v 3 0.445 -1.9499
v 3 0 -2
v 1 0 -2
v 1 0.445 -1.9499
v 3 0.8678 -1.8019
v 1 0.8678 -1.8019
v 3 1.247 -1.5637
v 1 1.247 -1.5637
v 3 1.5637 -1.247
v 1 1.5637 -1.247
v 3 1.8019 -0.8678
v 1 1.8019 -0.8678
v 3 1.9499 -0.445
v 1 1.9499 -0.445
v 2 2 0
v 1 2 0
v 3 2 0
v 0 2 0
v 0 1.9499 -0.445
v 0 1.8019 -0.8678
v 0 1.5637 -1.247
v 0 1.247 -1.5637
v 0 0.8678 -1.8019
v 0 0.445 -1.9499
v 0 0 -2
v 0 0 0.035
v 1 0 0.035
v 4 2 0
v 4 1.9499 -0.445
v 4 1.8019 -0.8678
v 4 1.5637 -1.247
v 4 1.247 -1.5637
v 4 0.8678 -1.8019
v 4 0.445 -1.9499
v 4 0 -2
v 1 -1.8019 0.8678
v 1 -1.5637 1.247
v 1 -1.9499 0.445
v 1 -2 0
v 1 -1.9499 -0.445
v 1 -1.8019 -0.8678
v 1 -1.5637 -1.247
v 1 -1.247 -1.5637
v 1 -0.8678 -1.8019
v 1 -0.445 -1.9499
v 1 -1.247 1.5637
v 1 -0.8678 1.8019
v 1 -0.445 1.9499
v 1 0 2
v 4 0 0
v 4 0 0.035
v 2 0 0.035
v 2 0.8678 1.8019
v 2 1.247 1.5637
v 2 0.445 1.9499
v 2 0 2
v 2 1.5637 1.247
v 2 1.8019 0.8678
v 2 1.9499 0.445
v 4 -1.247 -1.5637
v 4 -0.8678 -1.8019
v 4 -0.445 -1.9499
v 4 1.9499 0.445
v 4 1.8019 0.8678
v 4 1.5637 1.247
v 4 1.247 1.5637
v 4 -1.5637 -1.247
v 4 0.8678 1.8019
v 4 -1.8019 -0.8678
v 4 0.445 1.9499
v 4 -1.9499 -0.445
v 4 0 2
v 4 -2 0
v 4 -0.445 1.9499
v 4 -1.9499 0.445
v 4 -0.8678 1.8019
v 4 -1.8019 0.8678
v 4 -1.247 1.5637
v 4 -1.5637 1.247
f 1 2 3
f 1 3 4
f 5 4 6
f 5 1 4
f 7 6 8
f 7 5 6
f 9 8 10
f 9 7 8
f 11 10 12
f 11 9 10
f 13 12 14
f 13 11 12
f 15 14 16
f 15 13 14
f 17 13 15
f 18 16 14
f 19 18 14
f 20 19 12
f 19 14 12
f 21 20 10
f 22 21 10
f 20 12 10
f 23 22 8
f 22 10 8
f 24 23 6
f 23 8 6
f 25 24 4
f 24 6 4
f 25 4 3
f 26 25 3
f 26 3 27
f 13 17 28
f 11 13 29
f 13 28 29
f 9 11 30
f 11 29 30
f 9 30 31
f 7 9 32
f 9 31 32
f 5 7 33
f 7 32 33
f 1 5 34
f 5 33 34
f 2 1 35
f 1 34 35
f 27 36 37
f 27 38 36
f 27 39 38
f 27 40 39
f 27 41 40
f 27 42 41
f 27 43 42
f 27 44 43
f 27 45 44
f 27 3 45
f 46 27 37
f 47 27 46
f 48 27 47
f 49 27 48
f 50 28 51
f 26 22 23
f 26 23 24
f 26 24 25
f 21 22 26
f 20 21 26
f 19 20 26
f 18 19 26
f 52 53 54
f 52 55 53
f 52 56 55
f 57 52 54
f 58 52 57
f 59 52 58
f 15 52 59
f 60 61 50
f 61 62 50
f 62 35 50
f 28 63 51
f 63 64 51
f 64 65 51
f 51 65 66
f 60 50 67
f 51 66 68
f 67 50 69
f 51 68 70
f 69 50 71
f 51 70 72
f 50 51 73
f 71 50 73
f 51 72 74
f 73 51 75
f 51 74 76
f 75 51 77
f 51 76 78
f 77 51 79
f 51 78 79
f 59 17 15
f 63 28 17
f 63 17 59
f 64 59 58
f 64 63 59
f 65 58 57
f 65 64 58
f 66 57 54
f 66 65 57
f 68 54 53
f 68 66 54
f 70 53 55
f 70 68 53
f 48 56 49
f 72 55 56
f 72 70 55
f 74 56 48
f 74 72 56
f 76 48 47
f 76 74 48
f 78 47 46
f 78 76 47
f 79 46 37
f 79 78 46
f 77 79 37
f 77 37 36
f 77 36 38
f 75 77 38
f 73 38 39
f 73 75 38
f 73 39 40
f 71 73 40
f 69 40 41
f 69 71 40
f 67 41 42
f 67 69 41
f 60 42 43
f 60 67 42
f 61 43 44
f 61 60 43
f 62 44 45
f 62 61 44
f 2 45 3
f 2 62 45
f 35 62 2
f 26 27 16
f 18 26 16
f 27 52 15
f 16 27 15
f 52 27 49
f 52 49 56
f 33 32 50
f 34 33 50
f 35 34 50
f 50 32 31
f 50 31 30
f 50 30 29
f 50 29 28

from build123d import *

# Parameters (mm, degrees)
SKETCH5_W           = 4
SKETCH5_H           = 2
SKETCH6_W           = 1
SKETCH6_H           = 2
CUT_EXTRUDE5_DEPTH  = 11
SKETCH8_W           = 0.5
SKETCH8_H           = 2
CUT_EXTRUDE7_DEPTH  = 10
SKETCH9_W           = 1.5
SKETCH9_H           = 2
CUT_EXTRUDE8_DEPTH  = 10
BOSS_EXTRUDE1_DEPTH = 4
SKETCH13_W          = 4.449870591
SKETCH13_H          = 3.198188742
CUT_EXTRUDE10_DEPTH = 1


with BuildPart() as part:
    # Sketch5 → Revolve-Thin2 (revolve)
    with BuildSketch(Plane.XY):
        with Locations((2, 1)):
            Rectangle(SKETCH5_W, SKETCH5_H)
    revolve(axis=Axis((0, 0, 0), (1, 0, 0)))

    # Sketch6 → Cut-Extrude5 (cut)
    with BuildSketch(Plane.XY):
        with Locations((3.5, 1)):
            Rectangle(SKETCH6_W, SKETCH6_H)
        with Locations((0.5, 1)):
            Rectangle(SKETCH6_W, SKETCH6_H)
    extrude(amount=-CUT_EXTRUDE5_DEPTH, mode=Mode.SUBTRACT)

    # Sketch8 → Cut-Extrude7 (cut)
    with BuildSketch(Plane(origin=(0, 0, 0), x_dir=(-1, 0, 0), z_dir=(0, 0, -1))):
        with Locations((-0.25, 1)):
            Rectangle(SKETCH8_W, SKETCH8_H)
    extrude(amount=-CUT_EXTRUDE7_DEPTH, mode=Mode.SUBTRACT)

    # Sketch9 → Cut-Extrude8 (cut)
    with BuildSketch(Plane(origin=(0, 0, 0), x_dir=(-1, 0, 0), z_dir=(0, 0, -1))):
        with Locations((-1.25, 1)):
            Rectangle(SKETCH9_W, SKETCH9_H)
    extrude(amount=-CUT_EXTRUDE8_DEPTH, mode=Mode.SUBTRACT)

    # Sketch10 → Boss-Extrude1 (add)
    with BuildSketch(Plane(origin=(4, 0, 0), x_dir=(0, 0, -1), z_dir=(1, 0, 0))):
        with BuildLine():
            Line((2, 0), (-0.034977088, 0))
            Line((-0.034977088, 0), (0, 2))
            ThreePointArc((0, 2), (1.414213562, 1.414213562), (2, 0))
        make_face()
    extrude(amount=-BOSS_EXTRUDE1_DEPTH)

    # Sketch13 → Cut-Extrude10 (cut)
    with BuildSketch(Plane.ZY):
        with Locations((-0.224935296, -1.599094371)):
            Rectangle(SKETCH13_W, SKETCH13_H)
    extrude(amount=-CUT_EXTRUDE10_DEPTH, mode=Mode.SUBTRACT)


solid = part.part
